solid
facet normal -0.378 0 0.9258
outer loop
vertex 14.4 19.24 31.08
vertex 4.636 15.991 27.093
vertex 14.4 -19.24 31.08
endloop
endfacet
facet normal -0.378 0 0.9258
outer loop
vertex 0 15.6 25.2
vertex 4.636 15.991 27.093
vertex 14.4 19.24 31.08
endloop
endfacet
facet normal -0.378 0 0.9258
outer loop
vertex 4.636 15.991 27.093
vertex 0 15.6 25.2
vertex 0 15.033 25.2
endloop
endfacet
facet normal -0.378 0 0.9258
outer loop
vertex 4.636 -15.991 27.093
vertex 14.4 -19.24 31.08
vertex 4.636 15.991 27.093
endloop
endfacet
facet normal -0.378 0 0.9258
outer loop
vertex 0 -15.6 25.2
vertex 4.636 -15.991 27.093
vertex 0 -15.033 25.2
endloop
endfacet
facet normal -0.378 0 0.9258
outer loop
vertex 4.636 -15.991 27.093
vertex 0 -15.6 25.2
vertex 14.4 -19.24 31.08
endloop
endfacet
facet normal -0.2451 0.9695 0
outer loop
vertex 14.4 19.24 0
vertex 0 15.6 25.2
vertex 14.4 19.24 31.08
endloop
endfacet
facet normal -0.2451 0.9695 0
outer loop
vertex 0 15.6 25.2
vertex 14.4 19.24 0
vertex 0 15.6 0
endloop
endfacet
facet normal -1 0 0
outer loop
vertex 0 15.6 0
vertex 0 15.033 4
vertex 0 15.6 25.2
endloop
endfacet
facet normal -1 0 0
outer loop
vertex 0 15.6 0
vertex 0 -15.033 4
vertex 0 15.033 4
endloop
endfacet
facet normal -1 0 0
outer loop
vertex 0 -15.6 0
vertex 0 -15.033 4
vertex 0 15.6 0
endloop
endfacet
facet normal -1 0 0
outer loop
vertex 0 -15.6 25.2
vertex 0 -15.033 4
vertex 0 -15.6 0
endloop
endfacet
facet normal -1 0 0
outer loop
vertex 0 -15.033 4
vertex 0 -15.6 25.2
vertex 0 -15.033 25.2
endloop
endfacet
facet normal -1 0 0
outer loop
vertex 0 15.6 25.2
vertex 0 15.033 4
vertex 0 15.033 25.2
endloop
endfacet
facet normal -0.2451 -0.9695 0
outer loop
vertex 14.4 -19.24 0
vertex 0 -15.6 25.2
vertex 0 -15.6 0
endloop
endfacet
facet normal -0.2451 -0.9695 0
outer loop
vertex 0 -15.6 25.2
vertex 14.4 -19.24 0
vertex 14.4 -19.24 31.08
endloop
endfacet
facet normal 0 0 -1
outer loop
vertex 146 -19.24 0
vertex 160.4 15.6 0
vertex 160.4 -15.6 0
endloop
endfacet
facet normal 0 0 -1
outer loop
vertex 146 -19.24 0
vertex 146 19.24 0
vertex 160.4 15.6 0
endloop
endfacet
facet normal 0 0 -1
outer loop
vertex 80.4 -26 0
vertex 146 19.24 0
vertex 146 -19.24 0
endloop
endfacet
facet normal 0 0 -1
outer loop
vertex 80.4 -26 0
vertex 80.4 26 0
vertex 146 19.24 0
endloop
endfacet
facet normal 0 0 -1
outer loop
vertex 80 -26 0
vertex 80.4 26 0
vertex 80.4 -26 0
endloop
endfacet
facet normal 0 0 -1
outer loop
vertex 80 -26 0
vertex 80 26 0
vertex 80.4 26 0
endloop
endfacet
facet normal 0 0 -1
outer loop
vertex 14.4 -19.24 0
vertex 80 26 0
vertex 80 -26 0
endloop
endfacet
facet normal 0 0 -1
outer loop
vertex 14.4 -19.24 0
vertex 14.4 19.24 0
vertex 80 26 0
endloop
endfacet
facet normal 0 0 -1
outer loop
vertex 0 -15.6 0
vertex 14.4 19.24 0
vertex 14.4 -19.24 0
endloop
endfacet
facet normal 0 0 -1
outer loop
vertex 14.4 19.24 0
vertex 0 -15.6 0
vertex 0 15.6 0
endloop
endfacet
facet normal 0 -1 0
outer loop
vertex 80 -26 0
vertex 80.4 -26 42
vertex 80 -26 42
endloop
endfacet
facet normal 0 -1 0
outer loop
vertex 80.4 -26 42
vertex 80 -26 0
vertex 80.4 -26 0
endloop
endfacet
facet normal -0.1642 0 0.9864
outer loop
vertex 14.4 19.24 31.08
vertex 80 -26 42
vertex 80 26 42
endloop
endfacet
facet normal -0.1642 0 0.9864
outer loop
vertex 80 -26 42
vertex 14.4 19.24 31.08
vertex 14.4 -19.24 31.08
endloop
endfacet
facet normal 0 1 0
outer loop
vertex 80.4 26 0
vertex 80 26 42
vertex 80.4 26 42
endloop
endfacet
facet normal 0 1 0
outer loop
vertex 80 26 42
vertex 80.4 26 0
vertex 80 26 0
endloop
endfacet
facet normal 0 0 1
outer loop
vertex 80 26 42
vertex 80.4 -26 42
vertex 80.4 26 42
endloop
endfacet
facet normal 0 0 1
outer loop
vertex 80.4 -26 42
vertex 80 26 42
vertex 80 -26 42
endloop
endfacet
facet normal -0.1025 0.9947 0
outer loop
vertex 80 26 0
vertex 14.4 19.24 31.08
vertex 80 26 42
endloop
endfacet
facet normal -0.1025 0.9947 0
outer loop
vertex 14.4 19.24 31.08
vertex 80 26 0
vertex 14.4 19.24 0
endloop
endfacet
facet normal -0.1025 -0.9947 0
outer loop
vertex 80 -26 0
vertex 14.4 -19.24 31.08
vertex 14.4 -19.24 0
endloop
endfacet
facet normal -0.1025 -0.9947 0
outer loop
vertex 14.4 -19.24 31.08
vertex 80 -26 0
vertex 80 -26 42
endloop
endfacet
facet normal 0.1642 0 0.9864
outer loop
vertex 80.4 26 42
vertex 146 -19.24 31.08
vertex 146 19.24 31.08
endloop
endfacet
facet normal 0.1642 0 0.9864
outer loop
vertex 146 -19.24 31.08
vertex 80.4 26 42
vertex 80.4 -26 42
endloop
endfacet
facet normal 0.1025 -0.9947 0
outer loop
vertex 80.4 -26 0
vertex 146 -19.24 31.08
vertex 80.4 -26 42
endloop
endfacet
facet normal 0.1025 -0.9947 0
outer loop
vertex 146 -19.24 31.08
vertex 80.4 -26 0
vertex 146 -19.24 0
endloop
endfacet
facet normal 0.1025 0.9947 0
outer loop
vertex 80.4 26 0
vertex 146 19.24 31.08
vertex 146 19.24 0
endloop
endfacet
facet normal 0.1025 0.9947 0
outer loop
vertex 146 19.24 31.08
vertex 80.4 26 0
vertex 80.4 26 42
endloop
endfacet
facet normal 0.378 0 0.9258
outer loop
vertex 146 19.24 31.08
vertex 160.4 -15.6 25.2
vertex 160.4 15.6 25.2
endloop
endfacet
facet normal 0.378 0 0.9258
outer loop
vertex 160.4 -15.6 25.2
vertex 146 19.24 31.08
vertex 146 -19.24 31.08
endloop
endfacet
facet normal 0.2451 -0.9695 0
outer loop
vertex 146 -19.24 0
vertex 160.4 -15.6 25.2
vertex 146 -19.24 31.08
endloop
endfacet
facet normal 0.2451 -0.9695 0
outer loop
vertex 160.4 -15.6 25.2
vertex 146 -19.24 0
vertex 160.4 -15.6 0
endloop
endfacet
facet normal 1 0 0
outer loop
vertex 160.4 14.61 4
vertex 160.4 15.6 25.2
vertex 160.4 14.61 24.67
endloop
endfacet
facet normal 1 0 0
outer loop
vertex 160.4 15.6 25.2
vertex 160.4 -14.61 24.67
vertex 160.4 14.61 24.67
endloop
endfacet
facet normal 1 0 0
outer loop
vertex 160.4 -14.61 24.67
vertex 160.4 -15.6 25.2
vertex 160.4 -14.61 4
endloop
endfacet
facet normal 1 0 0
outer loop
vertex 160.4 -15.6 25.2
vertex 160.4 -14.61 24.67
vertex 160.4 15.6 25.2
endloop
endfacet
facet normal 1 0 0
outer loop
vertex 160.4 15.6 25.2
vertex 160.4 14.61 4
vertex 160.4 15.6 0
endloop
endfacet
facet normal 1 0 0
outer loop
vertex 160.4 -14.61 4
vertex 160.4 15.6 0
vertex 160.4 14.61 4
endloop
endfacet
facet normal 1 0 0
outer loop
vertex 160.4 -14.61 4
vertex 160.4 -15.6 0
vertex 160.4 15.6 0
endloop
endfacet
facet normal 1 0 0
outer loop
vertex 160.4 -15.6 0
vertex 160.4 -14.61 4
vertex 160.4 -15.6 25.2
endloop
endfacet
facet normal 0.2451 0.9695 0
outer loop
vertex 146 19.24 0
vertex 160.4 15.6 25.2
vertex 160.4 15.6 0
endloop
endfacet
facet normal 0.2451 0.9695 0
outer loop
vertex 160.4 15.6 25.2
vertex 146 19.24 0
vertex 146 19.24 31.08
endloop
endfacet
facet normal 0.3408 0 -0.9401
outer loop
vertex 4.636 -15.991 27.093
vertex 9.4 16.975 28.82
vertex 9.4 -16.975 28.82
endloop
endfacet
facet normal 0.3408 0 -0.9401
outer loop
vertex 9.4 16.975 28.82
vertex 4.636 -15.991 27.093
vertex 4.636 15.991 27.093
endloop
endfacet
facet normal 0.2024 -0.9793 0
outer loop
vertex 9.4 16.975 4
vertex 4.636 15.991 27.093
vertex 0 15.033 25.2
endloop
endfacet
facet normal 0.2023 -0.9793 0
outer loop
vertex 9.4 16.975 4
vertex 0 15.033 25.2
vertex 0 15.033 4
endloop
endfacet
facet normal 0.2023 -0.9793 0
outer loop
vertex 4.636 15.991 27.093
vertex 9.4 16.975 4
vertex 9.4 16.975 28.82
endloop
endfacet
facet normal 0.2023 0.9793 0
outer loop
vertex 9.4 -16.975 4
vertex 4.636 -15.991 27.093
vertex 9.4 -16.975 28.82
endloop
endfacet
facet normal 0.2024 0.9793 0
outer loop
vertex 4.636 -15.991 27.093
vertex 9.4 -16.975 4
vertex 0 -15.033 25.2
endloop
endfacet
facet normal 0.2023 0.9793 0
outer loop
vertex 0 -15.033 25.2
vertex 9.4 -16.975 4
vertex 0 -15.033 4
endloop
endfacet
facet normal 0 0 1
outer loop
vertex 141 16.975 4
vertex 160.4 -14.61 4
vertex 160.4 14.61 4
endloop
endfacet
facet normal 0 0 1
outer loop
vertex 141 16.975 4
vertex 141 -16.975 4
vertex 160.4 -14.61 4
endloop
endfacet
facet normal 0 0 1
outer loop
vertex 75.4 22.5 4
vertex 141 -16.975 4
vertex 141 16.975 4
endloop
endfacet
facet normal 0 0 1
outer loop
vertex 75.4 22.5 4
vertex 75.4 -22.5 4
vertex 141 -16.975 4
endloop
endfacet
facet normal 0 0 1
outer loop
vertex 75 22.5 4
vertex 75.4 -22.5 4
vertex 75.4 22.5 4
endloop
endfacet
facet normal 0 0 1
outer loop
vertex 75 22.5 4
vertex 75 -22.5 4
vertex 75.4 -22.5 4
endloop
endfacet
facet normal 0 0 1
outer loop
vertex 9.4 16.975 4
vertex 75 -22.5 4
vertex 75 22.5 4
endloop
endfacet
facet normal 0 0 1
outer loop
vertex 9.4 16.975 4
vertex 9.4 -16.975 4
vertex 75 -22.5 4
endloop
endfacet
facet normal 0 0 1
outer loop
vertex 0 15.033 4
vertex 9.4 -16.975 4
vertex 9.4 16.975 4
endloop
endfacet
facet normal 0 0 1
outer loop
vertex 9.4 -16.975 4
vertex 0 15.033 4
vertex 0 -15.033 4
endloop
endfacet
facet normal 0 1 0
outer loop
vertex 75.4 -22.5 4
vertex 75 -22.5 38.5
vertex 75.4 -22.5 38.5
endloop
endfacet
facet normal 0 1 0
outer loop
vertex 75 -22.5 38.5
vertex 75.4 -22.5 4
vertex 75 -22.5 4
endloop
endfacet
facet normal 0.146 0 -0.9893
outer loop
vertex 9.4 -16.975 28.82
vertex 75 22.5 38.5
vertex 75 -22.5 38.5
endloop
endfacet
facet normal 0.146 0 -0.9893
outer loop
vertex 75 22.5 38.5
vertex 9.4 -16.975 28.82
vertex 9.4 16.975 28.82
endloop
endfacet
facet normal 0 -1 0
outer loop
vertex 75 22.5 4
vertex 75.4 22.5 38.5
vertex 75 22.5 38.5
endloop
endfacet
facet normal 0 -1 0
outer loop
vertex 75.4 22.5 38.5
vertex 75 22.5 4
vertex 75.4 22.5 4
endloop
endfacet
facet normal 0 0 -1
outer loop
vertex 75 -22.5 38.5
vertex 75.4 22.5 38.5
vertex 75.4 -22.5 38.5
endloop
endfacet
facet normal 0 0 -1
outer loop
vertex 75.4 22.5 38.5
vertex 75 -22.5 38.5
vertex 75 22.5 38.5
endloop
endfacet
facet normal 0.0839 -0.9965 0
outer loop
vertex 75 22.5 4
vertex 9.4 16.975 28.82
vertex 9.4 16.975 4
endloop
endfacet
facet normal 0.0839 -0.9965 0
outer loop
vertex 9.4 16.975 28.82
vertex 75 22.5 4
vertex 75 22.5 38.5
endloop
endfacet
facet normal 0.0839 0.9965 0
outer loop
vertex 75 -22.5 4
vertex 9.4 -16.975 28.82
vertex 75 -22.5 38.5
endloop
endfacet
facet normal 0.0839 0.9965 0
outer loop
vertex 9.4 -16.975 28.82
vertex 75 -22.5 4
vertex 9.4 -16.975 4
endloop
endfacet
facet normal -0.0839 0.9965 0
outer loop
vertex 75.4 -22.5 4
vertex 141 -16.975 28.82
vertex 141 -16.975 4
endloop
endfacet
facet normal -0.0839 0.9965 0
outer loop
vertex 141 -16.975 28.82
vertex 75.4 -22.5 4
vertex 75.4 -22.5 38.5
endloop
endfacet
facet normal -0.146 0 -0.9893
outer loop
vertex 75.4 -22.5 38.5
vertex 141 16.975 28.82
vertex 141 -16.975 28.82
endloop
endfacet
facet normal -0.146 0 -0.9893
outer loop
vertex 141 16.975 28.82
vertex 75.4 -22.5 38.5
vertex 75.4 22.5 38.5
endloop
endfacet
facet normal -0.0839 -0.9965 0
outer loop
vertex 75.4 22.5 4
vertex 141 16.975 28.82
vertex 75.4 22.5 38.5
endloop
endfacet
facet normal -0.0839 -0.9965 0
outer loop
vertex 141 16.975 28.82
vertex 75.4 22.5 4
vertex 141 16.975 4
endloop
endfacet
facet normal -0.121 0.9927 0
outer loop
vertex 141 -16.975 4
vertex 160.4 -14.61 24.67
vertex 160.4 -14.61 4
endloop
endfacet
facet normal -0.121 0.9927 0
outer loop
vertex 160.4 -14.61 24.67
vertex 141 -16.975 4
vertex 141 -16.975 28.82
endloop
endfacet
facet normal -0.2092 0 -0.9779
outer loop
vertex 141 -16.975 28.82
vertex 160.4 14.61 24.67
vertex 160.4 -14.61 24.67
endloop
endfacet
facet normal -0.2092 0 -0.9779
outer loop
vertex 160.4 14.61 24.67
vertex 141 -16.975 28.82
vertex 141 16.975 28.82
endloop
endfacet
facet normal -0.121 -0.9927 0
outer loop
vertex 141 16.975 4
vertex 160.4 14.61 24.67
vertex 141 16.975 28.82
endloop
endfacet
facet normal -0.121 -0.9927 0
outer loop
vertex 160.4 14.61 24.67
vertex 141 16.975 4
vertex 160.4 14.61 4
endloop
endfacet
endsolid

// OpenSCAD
$fn = 32;

// ----------------------------------------------------------------------
// Faired channel: 160 x 52 x 42 mm, 3.5 mm walls, faired ends
// ----------------------------------------------------------------------

// --- parameters (mm) ---
length = 160;             // channel length
width = 52;               // channel width at mid length
height = 42;              // channel height at mid length
wall = 3.5;               // side wall thickness
floor_t = 4;              // floor thickness
end_w = 31.2;             // faired end width
end_h = 25.2;             // faired end height

difference() {
  union() {
    hull() {
      translate([0, -15.6, 0]) cube([0.4, 31.2, 25.2]);
      translate([14.4, -19.24, 0]) cube([0.4, 38.48, 31.08]);
    }
    hull() {
      translate([14.4, -19.24, 0]) cube([0.4, 38.48, 31.08]);
      translate([80, -26, 0]) cube([0.4, 52, 42]);
    }
    hull() {
      translate([80, -26, 0]) cube([0.4, 52, 42]);
      translate([145.6, -19.24, 0]) cube([0.4, 38.48, 31.08]);
    }
    hull() {
      translate([145.6, -19.24, 0]) cube([0.4, 38.48, 31.08]);
      translate([160, -15.6, 0]) cube([0.4, 31.2, 25.2]);
    }
  }
  /* cavity, 5 mm proud of both ends so the ports are cut clean */
  hull() {
    translate([-5, -14, 4]) cube([0.4, 28, 19.6]);
    translate([9.4, -16.975, 4]) cube([0.4, 33.95, 24.82]);
  }
  hull() {
    translate([9.4, -16.975, 4]) cube([0.4, 33.95, 24.82]);
    translate([75, -22.5, 4]) cube([0.4, 45, 34.5]);
  }
  hull() {
    translate([75, -22.5, 4]) cube([0.4, 45, 34.5]);
    translate([140.6, -16.975, 4]) cube([0.4, 33.95, 24.82]);
  }
  hull() {
    translate([140.6, -16.975, 4]) cube([0.4, 33.95, 24.82]);
    translate([165, -14, 4]) cube([0.4, 28, 19.6]);
  }
}
